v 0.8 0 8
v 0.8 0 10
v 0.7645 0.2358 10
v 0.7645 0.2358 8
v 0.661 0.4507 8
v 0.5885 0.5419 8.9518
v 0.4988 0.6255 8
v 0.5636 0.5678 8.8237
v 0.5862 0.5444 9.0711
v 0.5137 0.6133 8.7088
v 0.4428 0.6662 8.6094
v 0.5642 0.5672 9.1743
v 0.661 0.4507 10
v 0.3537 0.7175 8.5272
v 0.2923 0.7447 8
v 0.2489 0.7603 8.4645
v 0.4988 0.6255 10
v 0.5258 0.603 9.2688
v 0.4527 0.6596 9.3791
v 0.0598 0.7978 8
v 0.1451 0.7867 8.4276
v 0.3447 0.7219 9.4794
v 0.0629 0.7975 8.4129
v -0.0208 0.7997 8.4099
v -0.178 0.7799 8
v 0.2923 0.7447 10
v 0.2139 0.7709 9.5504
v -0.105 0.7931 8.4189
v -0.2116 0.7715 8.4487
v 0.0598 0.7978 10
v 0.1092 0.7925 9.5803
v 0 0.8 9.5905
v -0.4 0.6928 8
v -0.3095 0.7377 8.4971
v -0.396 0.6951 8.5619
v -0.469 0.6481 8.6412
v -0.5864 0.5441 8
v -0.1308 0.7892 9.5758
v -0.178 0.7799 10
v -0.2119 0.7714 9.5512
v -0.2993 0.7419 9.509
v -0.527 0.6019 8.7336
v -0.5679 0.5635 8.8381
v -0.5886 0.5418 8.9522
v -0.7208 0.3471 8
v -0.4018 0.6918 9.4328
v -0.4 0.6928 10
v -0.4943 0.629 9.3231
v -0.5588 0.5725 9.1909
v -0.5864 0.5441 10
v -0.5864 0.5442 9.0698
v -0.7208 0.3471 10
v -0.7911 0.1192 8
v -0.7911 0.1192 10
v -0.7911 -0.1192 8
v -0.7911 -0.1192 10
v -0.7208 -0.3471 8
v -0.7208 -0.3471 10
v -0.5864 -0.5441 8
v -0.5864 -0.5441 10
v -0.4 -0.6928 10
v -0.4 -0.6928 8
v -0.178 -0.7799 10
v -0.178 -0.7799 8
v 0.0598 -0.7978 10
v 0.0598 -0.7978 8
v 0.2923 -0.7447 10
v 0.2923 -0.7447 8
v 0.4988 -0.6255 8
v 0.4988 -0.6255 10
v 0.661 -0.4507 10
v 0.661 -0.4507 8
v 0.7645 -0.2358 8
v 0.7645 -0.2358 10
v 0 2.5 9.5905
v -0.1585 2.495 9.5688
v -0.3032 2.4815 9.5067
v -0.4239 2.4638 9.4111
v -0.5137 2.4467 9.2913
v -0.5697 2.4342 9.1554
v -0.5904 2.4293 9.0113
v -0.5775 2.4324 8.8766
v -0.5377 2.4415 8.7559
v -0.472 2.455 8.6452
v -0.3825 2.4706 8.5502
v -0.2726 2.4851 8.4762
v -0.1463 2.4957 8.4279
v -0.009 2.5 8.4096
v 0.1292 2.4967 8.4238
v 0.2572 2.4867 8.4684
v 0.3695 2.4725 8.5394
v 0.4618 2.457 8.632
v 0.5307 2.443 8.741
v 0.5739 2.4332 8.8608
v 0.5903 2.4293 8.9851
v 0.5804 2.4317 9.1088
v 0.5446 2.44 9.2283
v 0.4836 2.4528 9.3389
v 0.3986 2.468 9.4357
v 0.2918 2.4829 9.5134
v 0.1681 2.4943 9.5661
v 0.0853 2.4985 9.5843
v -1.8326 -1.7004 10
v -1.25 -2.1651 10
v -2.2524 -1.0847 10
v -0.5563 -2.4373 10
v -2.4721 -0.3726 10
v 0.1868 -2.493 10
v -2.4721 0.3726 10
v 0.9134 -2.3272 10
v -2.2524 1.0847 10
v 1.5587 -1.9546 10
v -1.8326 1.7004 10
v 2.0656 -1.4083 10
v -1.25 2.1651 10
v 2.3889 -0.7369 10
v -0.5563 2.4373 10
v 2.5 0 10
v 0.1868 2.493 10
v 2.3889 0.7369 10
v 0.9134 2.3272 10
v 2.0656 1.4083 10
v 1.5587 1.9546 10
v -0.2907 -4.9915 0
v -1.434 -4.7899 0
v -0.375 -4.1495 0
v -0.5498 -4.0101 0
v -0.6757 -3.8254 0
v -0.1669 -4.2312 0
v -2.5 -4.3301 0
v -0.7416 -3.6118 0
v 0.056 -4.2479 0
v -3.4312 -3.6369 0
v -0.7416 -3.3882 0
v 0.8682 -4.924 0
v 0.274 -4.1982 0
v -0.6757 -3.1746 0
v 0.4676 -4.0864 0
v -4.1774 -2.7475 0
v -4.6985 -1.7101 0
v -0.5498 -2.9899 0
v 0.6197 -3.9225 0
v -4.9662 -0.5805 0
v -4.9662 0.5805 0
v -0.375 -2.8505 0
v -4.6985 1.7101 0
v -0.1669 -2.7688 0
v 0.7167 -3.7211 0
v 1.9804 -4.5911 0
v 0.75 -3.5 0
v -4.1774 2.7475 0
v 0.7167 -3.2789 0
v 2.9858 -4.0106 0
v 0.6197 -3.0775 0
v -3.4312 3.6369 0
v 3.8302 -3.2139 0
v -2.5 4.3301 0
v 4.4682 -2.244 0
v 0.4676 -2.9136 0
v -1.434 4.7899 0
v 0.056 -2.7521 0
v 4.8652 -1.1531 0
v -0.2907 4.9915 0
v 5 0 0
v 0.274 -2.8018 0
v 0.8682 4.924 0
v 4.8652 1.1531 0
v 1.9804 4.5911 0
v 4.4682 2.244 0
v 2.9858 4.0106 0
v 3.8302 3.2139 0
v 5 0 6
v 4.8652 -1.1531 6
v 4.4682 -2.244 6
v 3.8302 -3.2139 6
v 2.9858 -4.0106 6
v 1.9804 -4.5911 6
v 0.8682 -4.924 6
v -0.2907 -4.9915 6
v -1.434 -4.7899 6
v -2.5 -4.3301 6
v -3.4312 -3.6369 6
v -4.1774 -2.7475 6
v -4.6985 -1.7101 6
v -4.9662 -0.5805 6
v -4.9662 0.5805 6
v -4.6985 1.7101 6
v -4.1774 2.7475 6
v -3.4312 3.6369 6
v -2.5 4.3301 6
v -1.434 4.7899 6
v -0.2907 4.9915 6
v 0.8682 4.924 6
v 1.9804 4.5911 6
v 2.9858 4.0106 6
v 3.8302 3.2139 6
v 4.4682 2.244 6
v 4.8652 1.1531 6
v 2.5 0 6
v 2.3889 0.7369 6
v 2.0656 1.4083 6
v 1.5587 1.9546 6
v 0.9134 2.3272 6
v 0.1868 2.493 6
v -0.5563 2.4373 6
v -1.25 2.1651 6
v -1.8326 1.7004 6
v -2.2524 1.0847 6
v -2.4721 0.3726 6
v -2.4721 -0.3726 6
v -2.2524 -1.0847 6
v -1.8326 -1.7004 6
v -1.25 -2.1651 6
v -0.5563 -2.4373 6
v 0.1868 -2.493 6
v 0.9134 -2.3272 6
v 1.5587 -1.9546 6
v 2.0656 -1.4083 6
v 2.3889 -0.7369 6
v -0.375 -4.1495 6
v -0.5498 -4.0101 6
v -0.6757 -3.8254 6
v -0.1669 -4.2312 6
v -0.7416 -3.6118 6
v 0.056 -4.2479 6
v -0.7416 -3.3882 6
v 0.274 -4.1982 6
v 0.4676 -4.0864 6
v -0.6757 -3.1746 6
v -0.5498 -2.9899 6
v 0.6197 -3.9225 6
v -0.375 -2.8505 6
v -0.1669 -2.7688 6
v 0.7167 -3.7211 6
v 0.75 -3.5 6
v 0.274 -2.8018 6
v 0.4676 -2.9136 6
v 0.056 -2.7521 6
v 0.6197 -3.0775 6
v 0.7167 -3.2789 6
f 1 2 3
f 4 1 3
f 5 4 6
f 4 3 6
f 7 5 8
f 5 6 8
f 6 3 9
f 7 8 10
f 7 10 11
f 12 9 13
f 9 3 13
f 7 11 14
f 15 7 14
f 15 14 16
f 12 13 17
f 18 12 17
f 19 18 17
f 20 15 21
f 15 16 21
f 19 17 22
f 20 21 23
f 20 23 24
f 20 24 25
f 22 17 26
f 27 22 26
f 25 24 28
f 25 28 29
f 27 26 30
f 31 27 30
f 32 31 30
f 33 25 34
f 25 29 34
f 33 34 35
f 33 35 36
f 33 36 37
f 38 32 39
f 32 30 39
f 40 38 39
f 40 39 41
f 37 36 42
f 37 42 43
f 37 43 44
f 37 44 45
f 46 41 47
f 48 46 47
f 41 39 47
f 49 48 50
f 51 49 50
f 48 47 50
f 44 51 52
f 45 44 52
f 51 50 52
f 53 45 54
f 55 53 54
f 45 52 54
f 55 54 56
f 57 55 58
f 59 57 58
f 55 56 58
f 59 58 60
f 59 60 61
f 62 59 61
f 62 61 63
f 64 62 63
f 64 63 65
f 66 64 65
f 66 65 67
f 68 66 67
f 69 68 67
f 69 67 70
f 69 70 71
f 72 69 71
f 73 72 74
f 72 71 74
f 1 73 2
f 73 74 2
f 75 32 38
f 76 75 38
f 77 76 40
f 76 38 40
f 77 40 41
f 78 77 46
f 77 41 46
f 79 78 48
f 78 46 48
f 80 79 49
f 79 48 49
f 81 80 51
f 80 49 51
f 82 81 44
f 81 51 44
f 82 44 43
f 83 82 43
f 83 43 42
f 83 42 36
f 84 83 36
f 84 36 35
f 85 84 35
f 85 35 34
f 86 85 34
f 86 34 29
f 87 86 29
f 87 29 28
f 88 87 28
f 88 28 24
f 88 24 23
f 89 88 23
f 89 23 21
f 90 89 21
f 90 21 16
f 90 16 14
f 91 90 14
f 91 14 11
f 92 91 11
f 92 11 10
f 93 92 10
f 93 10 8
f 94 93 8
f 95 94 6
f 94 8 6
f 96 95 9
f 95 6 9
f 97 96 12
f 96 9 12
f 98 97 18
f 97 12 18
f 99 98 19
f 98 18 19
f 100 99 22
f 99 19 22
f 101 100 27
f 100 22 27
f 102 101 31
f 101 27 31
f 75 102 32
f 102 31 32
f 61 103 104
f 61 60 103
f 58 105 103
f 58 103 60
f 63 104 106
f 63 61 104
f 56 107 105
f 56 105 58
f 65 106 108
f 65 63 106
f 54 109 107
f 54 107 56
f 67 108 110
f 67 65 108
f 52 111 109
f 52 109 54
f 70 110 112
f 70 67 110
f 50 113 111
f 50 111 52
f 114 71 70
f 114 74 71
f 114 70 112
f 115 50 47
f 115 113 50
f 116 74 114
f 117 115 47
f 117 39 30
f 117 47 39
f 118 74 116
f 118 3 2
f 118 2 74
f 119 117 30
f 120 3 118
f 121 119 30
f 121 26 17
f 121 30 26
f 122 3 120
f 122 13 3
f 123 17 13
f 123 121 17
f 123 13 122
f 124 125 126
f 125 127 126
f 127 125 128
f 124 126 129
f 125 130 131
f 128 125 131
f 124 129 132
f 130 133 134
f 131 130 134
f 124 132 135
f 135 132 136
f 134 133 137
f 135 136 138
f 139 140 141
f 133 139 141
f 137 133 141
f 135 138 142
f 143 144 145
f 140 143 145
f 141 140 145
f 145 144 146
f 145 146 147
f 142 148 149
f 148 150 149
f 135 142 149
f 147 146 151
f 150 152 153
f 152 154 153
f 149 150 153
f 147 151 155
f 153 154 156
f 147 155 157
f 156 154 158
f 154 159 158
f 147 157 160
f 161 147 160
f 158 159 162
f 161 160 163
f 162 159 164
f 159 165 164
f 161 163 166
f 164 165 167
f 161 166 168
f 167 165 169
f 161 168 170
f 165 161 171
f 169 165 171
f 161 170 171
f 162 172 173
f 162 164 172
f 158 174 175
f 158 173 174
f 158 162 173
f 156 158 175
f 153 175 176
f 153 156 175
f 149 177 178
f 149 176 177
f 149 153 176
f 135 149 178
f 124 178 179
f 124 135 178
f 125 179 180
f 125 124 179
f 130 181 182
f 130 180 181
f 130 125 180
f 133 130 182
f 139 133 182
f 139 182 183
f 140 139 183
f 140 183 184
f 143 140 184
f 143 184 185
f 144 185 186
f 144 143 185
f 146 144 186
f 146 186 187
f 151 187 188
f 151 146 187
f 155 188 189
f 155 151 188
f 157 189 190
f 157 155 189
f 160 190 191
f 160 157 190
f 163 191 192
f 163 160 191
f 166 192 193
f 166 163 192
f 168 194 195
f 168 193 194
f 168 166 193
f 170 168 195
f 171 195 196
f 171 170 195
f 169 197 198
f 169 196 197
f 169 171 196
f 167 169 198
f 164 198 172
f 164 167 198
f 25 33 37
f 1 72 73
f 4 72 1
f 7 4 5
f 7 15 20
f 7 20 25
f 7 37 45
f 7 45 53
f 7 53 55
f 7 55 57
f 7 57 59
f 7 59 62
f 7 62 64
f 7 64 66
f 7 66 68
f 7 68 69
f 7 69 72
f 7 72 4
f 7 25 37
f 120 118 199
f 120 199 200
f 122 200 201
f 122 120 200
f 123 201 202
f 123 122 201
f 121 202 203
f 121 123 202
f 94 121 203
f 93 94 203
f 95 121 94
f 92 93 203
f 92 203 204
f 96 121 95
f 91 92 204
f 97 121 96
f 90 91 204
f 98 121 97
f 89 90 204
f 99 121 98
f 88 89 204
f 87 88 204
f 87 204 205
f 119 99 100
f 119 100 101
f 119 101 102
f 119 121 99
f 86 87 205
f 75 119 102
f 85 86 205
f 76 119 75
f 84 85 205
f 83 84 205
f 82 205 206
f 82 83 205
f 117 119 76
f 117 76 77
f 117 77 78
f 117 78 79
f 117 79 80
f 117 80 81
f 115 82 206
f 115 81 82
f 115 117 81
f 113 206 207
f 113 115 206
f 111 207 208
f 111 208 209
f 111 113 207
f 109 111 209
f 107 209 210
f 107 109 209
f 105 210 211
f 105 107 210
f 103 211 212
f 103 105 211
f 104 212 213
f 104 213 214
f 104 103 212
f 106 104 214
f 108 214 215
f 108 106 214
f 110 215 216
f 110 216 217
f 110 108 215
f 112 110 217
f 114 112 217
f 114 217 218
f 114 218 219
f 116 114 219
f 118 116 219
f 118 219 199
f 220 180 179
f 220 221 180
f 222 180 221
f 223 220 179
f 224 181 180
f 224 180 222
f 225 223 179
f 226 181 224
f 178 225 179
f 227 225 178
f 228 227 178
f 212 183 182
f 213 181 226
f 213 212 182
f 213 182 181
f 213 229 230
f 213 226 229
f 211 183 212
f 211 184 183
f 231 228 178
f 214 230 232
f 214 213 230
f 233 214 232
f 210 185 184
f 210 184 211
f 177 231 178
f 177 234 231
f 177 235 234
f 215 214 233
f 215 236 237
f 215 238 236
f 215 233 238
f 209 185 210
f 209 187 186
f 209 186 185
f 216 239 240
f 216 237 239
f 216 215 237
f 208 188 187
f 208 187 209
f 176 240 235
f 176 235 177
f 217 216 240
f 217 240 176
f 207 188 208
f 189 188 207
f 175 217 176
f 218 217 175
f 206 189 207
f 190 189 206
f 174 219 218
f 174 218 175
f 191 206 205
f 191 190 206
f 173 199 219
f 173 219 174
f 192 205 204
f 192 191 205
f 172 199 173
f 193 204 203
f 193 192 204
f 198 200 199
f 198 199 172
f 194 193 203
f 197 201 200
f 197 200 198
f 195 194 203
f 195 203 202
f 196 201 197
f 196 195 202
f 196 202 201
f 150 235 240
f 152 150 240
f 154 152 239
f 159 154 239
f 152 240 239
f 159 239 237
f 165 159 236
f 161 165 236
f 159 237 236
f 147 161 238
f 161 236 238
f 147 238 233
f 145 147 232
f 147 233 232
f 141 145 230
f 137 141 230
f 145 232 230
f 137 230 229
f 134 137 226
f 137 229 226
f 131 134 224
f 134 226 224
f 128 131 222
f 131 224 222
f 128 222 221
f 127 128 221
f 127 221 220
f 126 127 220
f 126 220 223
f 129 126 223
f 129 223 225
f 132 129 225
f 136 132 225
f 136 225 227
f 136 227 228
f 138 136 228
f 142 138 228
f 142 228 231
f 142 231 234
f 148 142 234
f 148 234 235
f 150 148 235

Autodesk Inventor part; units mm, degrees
ref_plane "YZ Plane" through (0, 0, 0) normal (1, 0, 0) x (0, 1, 0)
ref_plane "XY Plane" through (0, 0, 0) normal (0, 0, 1) x (1, 0, 0)
sketch "Sketch1" plane through (0, 0, 0) normal (0, 0, 1) x (1, 0, 0)
  circle A0 centre (0, 0) radius 5
  dimension "d0" = 10
extrude "Extrusion1" add sketch "Sketch1" along normal blind 10
sketch "Sketch2" plane through (0, 0, 10) normal (0, 0, 1) x (1, 0, 0)
  circle A0 centre (0, 0) radius 5 projected
  circle A1 centre (0, 0) radius 0.8
  dimension "d3" = 1.6
extrude "Extrusion2" cut sketch "Sketch2" against normal blind 2 contours A1
sketch "Sketch3" plane through (0, 0, 10) normal (0, 0, 1) x (1, 0, 0)
  circle A0 centre (0, 0) radius 0.8 projected
  circle A1 centre (0, 0) radius 5 projected
ref_plane "Work Plane1" through (0, 5, 0) normal (0, 1, 0) x (-1, 0, 0)
sketch "Sketch4" plane through (0, 5, 0) normal (0, 1, 0) x (-1, 0, 0)
  line L0 (-5, 0) -> (-5, 10) projected
  line L1 (5, 0) -> (5, 10) projected
  line L2 (0, -2) -> (0, 12) projected
  line L3 (-5, 10) -> (5, 10) projected
  point P0 (0, 0)
  point P1 (0, 9)
  dimension "d8" = 1
hole "Hole1" at (0, 5, 9) direction (0, -1, 0) diameter 1.181 depth 5 thread size "0-80 UNF" class "2B" standard "ANSI Unified Screw Threads"
sketch "Sketch5" plane through (0, 0, 10) normal (0, 0, 1) x (1, 0, 0)
  circle A0 centre (0, 0) radius 5 projected
  circle A1 centre (0, 0) radius 2.5
  circle A2 centre (0, 0) radius 5
  dimension "d16" = 5
extrude "Extrusion3" cut sketch "Sketch5" against normal blind 4
sketch "Sketch6" plane through (0, 0, 10) normal (0, 0, 1) x (1, 0, 0)
  circle A0 centre (0, 0) radius 2.5 projected
  circle A1 centre (0, 0) radius 0.8 projected
sketch "Sketch7" plane through (0, 0, 6) normal (0, 0, 1) x (1, 0, 0)
  circle A0 centre (0, 0) radius 2.5 projected
  circle A1 centre (0, -3.5) radius 0.75
  dimension "d19" = 1.5
  dimension "d20" = 3.5
extrude "Extrusion4" cut sketch "Sketch7" against normal through all contours A1
properties part number "Jig_Bearing_Asm_Housing_Holder"
